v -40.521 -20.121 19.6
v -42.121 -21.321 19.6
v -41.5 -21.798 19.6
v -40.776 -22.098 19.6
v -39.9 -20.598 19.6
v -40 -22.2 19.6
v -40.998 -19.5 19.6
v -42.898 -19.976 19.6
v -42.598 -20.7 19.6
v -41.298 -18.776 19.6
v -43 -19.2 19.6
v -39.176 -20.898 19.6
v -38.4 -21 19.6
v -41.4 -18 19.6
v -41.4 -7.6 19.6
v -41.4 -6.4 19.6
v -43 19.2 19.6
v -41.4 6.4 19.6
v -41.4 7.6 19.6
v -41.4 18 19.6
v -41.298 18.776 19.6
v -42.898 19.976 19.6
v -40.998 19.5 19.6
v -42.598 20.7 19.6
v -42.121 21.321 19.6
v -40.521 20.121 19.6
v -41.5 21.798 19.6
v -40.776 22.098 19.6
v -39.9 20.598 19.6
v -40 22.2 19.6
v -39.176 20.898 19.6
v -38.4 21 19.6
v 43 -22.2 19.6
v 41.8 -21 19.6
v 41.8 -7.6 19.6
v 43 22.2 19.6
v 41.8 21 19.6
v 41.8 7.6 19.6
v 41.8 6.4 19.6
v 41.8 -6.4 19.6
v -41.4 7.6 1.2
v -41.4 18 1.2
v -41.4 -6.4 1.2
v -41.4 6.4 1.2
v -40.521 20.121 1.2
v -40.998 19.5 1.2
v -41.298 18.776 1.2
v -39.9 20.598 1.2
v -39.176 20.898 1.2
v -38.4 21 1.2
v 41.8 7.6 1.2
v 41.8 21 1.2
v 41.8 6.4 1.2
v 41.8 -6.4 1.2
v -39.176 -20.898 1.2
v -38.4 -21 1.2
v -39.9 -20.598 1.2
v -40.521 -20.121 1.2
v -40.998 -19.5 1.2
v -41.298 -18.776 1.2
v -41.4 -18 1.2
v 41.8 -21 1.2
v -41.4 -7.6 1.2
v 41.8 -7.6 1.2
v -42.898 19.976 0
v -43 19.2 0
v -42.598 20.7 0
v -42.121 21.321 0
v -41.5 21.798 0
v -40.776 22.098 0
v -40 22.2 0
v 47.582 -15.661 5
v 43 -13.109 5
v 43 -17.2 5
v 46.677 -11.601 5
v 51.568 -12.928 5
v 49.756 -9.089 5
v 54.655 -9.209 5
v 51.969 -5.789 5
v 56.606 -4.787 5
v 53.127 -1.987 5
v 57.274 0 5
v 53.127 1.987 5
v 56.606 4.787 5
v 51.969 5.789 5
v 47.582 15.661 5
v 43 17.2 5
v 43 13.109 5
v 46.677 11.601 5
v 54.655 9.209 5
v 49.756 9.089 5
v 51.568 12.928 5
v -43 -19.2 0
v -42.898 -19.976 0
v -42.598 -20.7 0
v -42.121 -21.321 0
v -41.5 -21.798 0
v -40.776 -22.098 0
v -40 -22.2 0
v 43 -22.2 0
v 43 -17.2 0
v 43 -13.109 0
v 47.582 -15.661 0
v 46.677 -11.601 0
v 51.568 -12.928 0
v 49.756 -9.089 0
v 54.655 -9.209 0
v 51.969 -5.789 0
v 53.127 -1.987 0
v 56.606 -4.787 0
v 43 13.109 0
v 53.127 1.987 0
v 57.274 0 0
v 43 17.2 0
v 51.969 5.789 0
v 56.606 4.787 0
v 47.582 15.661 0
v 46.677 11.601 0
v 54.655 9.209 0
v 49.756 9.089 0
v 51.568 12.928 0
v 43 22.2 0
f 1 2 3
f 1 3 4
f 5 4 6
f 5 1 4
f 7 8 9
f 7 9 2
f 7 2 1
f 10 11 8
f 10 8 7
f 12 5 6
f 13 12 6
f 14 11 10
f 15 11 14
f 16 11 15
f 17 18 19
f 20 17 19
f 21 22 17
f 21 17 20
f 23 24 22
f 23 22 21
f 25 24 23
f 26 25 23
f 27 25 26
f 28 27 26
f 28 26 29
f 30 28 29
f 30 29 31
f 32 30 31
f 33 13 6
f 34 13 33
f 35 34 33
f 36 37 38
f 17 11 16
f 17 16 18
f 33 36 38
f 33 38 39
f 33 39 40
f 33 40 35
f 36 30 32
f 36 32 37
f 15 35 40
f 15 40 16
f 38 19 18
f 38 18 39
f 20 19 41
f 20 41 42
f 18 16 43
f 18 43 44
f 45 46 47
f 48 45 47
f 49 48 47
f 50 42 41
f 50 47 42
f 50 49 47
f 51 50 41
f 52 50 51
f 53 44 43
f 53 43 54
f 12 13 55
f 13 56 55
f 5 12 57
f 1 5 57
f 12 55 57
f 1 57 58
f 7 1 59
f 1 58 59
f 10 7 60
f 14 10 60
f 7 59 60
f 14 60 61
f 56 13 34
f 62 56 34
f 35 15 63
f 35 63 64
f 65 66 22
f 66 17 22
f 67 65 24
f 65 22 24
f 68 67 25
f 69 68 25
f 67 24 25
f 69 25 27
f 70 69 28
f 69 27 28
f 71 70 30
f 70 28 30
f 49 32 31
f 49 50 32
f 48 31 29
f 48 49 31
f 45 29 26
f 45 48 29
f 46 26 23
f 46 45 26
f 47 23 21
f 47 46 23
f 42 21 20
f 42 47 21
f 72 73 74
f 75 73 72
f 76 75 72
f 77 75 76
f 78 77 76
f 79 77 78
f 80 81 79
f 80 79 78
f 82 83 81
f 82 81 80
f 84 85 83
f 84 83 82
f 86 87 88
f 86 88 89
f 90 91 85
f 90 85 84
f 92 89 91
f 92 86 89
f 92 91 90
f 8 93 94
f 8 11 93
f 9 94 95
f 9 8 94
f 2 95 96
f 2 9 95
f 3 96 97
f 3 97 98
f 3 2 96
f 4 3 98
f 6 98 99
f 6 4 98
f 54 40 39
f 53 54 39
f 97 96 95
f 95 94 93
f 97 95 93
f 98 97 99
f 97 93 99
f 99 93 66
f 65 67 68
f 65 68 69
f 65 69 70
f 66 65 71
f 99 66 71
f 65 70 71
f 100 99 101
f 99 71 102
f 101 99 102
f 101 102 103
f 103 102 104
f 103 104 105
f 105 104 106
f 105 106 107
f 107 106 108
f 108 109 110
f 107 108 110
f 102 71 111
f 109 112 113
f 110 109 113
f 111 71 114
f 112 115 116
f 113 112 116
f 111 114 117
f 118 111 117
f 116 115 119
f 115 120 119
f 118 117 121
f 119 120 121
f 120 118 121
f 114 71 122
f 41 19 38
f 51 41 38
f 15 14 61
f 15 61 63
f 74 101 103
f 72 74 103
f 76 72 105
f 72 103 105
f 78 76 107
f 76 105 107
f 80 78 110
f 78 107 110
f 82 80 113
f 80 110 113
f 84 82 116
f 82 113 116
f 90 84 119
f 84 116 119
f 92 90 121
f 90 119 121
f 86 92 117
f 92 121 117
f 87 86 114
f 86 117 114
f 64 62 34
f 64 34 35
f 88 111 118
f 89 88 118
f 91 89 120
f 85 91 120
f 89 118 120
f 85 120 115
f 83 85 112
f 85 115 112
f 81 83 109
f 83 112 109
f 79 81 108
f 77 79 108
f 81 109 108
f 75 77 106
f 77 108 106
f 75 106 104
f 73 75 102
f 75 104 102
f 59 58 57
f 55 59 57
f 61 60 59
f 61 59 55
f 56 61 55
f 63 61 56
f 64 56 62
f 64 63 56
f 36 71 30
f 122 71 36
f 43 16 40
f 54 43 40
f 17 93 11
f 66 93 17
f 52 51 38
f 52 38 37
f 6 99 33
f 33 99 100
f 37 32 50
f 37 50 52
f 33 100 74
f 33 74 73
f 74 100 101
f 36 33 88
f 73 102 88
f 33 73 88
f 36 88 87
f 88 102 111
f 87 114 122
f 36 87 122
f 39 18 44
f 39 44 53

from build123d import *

# Parameters (mm, degrees)
SKETCH_1_W          = 86
SKETCH_1_H          = 44.4
EXTRUDE_1_DEPTH     = 19.6
EXTRUDE_2_DEPTH     = 5
SKETCH_3_W          = 83.2
SKETCH_3_H          = 13.4
SKETCH_3_H_2        = 12.8
CUT_EXTRUDE_1_DEPTH = 18.4
FILLET_1_R          = 3


with BuildPart() as part:
    # Эскиз1 → Бобышка-Вытянуть1 (new body)
    with BuildSketch(Plane.XY):
        Rectangle(SKETCH_1_W, SKETCH_1_H)
    extrude(amount=EXTRUDE_1_DEPTH)

    # Эскиз2 → Бобышка-Вытянуть2 (add)
    with BuildSketch(Plane.XY):
        with BuildLine():
            Line((43, 17.2), (43, 13.108775687))
            ThreePointArc((43, 13.108775687), (53.273546839, 0), (43, -13.108775687))
            Line((43, -13.108775687), (43, -17.2))
            ThreePointArc((43, -17.2), (57.273546839, 0), (43, 17.2))
        make_face()
    extrude(amount=EXTRUDE_2_DEPTH)

    # Эскиз3 → Вырез-Вытянуть1 (cut)
    with BuildSketch(Plane.XY.offset(19.6)):
        with Locations((0.2, 14.3)):
            Rectangle(SKETCH_3_W, SKETCH_3_H)
        with Locations((0.2, 0)):
            Rectangle(SKETCH_3_W, SKETCH_3_H_2)
        with Locations((0.2, -14.3)):
            Rectangle(SKETCH_3_W, SKETCH_3_H)
    extrude(amount=-CUT_EXTRUDE_1_DEPTH, mode=Mode.SUBTRACT)

    # Скругление1
    fillet_1_edges = [part.edges().sort_by_distance(p)[0] for p in [
        (-41.4, 21, 10.4),
        (-41.4, -21, 10.4),
        (-43, -22.2, 9.8),
        (-43, 22.2, 9.8),
    ]]
    fillet(fillet_1_edges, radius=FILLET_1_R)


solid = part.part
